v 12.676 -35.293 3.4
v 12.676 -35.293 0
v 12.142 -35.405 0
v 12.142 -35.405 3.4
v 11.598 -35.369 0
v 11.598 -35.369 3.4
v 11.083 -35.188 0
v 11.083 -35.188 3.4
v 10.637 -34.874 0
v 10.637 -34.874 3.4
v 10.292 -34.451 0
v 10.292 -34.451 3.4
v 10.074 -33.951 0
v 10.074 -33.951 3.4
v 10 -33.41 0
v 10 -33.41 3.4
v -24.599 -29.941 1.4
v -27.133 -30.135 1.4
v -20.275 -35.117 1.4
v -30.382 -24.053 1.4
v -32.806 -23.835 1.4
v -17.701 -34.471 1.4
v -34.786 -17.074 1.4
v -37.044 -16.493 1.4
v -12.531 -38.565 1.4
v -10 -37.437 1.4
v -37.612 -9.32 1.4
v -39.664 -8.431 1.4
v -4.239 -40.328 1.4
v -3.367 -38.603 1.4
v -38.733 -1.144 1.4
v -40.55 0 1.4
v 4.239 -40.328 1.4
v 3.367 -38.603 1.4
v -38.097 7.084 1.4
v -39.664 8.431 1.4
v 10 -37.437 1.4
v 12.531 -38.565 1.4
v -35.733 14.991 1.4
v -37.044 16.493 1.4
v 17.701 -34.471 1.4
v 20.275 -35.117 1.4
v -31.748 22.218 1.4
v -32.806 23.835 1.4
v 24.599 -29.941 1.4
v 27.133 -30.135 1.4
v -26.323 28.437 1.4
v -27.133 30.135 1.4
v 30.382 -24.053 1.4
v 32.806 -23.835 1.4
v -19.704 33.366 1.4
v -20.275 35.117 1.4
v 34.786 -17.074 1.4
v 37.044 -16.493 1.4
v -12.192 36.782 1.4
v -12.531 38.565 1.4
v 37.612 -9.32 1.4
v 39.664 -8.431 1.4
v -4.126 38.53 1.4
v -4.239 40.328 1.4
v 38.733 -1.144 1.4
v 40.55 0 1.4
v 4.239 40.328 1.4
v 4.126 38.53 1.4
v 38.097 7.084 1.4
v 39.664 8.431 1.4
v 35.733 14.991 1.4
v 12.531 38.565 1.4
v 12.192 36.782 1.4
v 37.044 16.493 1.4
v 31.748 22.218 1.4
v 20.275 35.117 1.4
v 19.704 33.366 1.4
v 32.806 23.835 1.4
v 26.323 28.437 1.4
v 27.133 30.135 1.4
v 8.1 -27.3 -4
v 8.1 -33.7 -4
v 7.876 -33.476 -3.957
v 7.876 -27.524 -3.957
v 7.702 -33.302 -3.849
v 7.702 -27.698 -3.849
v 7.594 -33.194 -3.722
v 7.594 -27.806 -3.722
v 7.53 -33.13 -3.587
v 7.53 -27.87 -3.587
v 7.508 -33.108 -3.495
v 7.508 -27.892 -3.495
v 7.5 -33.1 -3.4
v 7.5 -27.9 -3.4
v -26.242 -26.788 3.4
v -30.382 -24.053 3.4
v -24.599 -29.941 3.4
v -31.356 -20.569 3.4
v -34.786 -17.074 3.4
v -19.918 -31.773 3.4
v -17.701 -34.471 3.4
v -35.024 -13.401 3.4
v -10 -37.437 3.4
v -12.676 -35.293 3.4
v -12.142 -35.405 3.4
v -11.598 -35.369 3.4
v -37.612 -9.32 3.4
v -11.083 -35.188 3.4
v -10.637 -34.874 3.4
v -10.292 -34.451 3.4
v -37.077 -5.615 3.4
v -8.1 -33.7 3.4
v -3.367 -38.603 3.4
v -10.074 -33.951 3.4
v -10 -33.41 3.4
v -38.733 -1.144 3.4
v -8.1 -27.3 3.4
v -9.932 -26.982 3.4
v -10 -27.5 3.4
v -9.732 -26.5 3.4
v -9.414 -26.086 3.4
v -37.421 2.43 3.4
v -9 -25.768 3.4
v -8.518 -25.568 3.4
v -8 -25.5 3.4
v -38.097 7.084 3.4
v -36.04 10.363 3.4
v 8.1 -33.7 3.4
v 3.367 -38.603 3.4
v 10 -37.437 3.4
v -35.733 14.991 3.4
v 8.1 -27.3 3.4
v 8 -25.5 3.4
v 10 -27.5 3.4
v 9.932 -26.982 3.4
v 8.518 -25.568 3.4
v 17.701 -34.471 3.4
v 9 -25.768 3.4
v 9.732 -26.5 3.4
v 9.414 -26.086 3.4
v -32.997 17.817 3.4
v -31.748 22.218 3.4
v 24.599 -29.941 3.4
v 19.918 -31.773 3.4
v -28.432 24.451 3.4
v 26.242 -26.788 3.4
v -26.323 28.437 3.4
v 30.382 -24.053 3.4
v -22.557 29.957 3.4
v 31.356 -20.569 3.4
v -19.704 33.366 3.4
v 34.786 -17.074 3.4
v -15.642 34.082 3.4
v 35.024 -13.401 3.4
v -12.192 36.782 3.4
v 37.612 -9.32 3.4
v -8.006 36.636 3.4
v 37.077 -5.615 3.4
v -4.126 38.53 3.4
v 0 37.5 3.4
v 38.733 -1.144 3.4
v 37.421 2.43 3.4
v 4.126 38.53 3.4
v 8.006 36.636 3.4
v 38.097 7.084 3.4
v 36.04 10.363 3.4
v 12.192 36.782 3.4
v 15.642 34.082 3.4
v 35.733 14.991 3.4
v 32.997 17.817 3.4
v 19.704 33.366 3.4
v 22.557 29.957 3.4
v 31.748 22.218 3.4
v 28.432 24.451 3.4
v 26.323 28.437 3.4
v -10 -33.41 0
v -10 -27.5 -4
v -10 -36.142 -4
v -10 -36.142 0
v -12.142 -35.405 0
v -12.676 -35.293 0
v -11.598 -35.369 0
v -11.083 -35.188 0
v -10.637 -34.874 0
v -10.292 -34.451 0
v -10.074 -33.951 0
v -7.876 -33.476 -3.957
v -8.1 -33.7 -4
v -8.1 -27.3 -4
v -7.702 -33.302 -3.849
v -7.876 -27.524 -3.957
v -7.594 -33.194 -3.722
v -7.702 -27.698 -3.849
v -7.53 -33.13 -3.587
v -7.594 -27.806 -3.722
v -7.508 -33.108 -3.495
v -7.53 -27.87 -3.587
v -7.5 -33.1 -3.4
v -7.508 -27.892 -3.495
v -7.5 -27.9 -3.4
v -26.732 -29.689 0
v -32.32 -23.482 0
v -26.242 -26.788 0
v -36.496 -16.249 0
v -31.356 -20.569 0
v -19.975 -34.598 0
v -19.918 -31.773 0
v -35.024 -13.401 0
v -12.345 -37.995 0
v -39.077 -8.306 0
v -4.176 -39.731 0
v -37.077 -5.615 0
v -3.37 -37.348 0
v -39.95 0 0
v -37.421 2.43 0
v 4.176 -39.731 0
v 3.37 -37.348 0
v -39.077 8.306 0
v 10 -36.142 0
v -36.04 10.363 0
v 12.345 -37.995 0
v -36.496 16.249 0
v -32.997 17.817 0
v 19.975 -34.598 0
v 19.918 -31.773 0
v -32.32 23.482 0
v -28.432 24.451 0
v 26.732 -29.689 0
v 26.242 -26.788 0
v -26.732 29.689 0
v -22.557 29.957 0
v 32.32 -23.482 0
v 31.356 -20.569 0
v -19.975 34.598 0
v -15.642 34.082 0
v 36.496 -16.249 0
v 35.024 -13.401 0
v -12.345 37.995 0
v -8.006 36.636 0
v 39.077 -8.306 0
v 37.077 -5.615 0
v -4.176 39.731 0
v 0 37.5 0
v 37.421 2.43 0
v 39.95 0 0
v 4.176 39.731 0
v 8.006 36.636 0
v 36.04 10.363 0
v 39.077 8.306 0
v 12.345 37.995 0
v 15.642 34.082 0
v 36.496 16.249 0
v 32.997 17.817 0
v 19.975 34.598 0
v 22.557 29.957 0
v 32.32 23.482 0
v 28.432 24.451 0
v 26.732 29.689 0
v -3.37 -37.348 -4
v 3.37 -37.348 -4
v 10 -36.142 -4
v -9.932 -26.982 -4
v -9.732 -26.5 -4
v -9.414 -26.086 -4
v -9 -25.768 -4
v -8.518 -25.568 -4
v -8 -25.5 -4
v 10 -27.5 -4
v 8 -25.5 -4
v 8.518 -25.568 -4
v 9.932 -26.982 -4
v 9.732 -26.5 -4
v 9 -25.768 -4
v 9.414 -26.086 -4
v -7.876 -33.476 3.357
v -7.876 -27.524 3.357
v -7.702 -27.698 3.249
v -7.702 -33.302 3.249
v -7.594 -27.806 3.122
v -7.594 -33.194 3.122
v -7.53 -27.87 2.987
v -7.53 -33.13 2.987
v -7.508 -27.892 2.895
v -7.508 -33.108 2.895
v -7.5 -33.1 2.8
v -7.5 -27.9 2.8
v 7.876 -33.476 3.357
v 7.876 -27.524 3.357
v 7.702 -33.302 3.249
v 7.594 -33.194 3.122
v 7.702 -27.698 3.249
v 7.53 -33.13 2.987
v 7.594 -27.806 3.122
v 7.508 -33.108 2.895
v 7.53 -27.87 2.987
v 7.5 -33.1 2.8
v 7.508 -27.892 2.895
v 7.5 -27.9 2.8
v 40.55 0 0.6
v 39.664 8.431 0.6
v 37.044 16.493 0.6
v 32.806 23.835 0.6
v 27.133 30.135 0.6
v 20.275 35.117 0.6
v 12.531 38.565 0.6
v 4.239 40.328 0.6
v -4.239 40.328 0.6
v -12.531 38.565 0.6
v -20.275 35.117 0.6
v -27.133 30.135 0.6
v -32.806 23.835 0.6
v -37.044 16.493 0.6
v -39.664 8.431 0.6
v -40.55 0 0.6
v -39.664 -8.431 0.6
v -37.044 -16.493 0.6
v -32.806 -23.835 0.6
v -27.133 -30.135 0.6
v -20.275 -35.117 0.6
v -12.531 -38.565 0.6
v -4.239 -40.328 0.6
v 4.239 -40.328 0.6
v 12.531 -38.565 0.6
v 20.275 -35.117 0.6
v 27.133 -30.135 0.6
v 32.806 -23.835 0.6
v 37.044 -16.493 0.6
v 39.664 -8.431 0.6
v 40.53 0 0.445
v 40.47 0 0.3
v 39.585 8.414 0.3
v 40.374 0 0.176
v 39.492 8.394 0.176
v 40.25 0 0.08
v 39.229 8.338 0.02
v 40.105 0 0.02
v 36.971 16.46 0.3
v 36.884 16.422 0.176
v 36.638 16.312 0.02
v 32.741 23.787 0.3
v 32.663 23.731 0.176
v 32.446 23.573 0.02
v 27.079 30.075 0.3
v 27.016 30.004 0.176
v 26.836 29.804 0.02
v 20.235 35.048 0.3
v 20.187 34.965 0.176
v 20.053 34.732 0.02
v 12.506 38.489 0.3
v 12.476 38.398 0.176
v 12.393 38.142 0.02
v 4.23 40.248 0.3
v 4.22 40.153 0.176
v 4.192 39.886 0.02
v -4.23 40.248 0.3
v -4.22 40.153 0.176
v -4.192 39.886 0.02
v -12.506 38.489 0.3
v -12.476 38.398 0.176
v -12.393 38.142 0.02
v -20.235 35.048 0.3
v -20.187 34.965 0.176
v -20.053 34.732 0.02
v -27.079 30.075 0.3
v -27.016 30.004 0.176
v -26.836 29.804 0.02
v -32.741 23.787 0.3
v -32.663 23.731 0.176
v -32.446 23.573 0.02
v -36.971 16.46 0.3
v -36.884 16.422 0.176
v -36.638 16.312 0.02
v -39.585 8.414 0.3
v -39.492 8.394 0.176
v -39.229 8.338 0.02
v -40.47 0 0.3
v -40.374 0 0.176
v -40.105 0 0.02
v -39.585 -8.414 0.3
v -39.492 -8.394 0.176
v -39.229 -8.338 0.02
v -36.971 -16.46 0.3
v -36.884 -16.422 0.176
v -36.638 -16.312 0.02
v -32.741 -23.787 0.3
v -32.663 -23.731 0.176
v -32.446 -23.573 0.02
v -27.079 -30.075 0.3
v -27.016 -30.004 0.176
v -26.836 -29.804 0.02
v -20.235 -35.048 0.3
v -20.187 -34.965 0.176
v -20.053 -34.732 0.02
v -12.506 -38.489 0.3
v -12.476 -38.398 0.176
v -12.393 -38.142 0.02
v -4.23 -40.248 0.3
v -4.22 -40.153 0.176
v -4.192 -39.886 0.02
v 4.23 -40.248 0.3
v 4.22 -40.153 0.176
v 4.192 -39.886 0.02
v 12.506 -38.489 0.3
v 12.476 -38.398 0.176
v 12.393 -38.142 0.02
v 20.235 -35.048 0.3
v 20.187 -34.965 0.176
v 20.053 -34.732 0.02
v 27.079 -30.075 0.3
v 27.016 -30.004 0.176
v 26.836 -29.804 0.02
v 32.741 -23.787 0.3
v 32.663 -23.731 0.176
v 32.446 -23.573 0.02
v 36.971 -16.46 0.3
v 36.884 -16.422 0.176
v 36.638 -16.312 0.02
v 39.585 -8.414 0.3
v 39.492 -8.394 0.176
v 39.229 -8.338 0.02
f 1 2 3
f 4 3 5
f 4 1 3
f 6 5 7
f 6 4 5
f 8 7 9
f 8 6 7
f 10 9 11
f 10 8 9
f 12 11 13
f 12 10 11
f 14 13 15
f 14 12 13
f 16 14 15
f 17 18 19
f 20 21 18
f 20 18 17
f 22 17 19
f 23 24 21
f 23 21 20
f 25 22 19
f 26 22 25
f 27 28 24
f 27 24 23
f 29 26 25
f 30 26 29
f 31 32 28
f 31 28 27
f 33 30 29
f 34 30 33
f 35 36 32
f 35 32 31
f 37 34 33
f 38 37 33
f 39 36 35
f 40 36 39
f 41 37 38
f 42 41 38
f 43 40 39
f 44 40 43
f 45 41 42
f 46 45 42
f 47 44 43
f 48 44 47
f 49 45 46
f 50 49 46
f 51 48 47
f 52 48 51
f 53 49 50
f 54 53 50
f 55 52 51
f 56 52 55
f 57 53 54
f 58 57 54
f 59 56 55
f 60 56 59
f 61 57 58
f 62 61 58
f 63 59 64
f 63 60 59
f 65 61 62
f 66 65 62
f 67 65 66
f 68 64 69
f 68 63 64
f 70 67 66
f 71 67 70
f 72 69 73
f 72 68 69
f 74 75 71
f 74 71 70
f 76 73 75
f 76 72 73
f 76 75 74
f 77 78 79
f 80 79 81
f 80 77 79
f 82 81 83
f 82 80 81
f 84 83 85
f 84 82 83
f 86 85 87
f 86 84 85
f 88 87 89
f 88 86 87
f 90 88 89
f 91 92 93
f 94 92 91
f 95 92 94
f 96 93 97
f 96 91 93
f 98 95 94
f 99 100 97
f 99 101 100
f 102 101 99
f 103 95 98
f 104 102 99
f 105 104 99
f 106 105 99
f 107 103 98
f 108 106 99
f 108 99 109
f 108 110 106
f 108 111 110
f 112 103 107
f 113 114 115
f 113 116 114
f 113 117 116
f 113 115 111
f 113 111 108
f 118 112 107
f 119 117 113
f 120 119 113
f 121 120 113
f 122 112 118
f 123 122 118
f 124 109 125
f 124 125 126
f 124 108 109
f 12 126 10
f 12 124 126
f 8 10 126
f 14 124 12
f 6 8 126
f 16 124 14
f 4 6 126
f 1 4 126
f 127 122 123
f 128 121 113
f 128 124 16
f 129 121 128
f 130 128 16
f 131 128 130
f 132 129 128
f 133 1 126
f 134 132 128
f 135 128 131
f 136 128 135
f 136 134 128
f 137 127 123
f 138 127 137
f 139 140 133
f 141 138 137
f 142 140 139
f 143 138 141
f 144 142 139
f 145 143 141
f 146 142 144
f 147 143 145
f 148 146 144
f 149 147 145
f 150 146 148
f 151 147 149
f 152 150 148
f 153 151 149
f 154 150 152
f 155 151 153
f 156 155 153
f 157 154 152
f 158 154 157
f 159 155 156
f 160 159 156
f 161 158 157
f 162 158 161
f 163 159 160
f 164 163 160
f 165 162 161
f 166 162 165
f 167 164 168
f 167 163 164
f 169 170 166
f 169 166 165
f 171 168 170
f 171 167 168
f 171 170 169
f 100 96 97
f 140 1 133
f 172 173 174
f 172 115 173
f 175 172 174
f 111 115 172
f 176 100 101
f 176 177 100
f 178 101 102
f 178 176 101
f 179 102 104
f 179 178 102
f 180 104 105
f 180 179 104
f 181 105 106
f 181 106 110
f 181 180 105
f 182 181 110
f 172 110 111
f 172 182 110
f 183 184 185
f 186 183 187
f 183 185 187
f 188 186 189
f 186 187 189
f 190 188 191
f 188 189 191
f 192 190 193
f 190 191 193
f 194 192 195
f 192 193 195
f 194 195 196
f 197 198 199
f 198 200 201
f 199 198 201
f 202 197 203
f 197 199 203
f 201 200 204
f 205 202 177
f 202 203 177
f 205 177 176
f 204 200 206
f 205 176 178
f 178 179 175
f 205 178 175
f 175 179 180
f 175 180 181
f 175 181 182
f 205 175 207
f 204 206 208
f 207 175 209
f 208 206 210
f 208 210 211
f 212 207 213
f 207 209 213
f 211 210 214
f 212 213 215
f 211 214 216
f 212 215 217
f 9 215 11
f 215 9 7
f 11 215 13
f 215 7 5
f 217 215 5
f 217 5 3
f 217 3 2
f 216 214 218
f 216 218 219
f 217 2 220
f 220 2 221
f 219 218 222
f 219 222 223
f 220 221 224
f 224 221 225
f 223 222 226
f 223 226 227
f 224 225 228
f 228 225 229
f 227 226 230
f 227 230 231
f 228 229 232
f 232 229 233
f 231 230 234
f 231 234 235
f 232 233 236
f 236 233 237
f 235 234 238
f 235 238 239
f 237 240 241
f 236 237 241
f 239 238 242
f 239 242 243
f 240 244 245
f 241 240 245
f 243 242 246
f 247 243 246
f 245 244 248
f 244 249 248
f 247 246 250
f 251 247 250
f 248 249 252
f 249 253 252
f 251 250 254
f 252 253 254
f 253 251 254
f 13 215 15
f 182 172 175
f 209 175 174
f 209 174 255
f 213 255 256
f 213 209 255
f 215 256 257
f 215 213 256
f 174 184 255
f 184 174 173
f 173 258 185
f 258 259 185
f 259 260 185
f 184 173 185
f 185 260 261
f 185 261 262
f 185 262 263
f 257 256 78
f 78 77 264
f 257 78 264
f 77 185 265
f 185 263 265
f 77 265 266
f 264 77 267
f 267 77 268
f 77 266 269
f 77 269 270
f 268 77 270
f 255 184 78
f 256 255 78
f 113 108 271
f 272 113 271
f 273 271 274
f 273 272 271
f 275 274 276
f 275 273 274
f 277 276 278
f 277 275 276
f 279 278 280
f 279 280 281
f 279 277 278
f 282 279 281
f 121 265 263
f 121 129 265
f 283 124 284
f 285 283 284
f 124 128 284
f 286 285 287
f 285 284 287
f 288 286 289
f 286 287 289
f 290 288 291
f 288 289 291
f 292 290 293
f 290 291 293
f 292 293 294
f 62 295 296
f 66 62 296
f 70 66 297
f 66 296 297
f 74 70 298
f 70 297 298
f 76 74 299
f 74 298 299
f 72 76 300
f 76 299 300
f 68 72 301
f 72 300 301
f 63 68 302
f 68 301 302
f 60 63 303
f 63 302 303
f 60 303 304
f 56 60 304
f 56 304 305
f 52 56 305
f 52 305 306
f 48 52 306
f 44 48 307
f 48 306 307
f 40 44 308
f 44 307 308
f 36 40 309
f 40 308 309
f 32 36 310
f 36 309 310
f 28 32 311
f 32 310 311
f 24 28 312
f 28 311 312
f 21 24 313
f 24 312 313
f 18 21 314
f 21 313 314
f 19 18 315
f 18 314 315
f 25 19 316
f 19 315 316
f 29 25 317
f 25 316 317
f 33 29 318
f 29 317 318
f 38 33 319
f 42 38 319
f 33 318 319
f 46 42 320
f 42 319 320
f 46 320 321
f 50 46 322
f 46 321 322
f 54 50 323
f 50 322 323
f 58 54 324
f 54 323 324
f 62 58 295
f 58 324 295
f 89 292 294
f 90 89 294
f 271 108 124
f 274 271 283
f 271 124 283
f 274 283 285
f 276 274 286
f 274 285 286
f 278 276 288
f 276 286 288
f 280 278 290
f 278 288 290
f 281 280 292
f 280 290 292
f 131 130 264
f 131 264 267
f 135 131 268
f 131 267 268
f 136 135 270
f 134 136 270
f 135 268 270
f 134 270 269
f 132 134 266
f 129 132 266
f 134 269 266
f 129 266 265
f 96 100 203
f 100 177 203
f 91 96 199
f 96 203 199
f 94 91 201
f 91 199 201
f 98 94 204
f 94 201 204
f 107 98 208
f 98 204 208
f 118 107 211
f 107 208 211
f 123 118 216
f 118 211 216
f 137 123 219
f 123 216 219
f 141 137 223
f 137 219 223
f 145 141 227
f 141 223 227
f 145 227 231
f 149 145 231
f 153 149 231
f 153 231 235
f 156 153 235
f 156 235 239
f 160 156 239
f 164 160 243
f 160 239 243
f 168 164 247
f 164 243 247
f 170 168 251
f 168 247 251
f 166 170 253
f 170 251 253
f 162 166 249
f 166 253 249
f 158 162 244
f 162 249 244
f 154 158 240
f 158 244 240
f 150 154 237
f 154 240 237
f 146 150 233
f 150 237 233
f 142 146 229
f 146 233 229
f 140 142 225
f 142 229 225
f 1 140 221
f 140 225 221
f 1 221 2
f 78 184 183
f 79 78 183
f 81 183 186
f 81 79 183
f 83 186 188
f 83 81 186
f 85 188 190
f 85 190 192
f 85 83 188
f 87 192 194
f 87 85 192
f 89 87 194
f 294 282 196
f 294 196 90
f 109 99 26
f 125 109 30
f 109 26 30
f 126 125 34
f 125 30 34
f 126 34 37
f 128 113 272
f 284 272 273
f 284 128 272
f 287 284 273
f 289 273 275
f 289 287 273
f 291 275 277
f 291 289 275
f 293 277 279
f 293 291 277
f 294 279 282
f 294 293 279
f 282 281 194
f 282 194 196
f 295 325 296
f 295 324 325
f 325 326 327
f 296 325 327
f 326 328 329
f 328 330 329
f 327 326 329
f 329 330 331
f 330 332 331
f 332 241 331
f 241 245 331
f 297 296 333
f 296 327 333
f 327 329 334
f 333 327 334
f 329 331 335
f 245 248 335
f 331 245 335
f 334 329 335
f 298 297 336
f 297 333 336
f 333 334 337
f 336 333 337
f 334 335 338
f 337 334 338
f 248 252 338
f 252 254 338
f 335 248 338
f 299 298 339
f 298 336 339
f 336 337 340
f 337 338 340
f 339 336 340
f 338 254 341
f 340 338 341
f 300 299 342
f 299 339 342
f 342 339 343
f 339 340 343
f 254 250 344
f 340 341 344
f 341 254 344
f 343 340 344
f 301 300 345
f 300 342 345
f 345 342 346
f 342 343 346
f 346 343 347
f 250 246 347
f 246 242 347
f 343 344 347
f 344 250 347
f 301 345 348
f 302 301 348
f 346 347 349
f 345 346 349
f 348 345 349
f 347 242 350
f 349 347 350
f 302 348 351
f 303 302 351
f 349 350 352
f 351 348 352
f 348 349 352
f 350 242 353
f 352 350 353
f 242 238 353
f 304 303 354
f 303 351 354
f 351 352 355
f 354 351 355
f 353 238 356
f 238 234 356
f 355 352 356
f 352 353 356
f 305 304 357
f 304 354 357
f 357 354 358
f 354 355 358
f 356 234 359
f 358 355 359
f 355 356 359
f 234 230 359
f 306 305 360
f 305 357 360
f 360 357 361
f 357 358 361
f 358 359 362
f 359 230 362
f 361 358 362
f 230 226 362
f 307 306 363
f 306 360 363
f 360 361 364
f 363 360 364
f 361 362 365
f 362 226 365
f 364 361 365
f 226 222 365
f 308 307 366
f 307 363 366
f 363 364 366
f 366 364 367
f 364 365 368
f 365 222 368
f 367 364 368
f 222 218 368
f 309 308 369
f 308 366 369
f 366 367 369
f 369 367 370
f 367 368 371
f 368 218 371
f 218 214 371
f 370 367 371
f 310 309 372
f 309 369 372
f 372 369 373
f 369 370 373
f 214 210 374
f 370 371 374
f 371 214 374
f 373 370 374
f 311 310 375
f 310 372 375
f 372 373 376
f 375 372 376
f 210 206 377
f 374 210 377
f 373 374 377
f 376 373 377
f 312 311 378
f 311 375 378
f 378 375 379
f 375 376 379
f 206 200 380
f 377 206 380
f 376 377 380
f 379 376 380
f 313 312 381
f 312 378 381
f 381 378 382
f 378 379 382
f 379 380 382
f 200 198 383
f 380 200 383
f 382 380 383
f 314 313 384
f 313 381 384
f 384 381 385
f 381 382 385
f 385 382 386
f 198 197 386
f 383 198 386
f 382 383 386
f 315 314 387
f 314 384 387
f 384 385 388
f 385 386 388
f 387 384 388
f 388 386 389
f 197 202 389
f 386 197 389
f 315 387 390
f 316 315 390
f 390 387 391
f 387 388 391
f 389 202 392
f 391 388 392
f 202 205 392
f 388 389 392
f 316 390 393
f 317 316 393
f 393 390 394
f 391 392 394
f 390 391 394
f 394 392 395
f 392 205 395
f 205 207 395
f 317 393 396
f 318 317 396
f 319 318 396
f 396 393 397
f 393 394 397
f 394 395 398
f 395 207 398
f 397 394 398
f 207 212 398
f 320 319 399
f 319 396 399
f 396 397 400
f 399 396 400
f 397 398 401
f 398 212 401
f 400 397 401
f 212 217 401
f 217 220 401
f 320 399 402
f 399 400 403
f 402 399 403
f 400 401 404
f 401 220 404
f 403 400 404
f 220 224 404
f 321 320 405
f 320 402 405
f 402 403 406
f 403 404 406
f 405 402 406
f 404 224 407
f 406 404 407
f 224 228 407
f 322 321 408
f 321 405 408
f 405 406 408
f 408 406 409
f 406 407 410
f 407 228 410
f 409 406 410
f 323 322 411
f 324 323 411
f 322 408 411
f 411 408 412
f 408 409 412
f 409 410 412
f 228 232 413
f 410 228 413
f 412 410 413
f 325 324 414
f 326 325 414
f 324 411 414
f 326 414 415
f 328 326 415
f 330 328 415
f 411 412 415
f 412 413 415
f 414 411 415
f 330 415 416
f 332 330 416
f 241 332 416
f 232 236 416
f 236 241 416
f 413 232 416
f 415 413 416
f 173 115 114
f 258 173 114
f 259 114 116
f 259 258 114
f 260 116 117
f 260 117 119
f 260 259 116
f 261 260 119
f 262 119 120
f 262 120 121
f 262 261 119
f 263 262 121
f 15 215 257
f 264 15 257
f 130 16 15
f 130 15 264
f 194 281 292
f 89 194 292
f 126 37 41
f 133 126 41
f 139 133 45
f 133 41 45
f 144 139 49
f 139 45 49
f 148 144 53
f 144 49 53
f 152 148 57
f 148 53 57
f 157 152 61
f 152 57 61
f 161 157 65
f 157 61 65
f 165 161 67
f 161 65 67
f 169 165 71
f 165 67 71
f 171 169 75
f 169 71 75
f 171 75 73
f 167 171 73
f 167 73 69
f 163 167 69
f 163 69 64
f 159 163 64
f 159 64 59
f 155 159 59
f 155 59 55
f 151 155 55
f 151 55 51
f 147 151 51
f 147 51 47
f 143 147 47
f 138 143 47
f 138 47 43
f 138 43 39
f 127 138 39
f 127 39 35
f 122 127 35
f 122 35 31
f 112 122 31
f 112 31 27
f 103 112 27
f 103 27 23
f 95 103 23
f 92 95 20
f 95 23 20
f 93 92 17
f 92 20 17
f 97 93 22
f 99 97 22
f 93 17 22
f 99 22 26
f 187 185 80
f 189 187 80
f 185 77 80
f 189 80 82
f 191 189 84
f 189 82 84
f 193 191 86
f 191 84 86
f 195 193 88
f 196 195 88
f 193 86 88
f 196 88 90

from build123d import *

# Parameters (mm, degrees)
F0_R     = 40.55
F0_W     = 15
F0_H     = 5.2
F1_DEPTH = 1.4
F2_DEPTH = 3.4
F3_DEPTH = 4
F4_R     = 0.6
F5_R     = 2
F6_R     = 0.6


with BuildPart() as f1:
    # F0 (on Top) → F1 (new body)
    with BuildSketch(Plane.XY):
        Circle(F0_R)
        with BuildLine():
            ThreePointArc((-10, -37.4374478297), (-23.6015094856, 30.7332271329), (38.75, 0))
            ThreePointArc((38.75, 0), (30.7332271329, -23.6015094856), (10, -37.4374478297))
            Line((10, -37.4374478297), (10, -39))
            Line((10, -39), (-10, -39))
            Line((-10, -39), (-10, -37.4374478297))
        make_face(mode=Mode.SUBTRACT)
        with BuildLine():
            ThreePointArc((10, -37.4374478297), (30.7332271329, -23.6015094856), (38.75, 0))
            ThreePointArc((38.75, 0), (-23.6015094856, 30.7332271329), (-10, -37.4374478297))
            Line((-10, -37.4374478297), (-10, -36.142080737))
            ThreePointArc((-10, -36.142080737), (-22.7073776557, 29.8433409658), (37.5, 0))
            ThreePointArc((37.5, 0), (29.8433409658, -22.7073776557), (10, -36.142080737))
            Line((10, -36.142080737), (10, -37.4374478297))
        make_face()
        with BuildLine():
            Line((-10, -25.5), (-10, -36.142080737))
            ThreePointArc((-10, -36.142080737), (0, -37.5), (10, -36.142080737))
            Line((10, -36.142080737), (10, -25.5))
            Line((10, -25.5), (-10, -25.5))
        make_face()
        with Locations((0, -30.5)):
            Rectangle(F0_W, F0_H, mode=Mode.SUBTRACT)
        with BuildLine():
            Line((-10, -36.142080737), (-10, -37.4374478297))
            ThreePointArc((-10, -37.4374478297), (0, -38.75), (10, -37.4374478297))
            Line((10, -37.4374478297), (10, -36.142080737))
            ThreePointArc((10, -36.142080737), (0, -37.5), (-10, -36.142080737))
        make_face()
        with BuildLine():
            ThreePointArc((10, -37.4374478297), (0, -38.75), (-10, -37.4374478297))
            Line((-10, -37.4374478297), (-10, -39))
            Line((-10, -39), (10, -39))
            Line((10, -39), (10, -37.4374478297))
        make_face()
    extrude(amount=F1_DEPTH)

    # F0 (on Top) → F2 (join)
    with BuildSketch(Plane.XY):
        with BuildLine():
            ThreePointArc((10, -37.4374478297), (30.7332271329, -23.6015094856), (38.75, 0))
            ThreePointArc((38.75, 0), (-23.6015094856, 30.7332271329), (-10, -37.4374478297))
            Line((-10, -37.4374478297), (-10, -36.142080737))
            ThreePointArc((-10, -36.142080737), (-22.7073776557, 29.8433409658), (37.5, 0))
            ThreePointArc((37.5, 0), (29.8433409658, -22.7073776557), (10, -36.142080737))
            Line((10, -36.142080737), (10, -37.4374478297))
        make_face()
        with BuildLine():
            Line((-10, -36.142080737), (-10, -37.4374478297))
            ThreePointArc((-10, -37.4374478297), (0, -38.75), (10, -37.4374478297))
            Line((10, -37.4374478297), (10, -36.142080737))
            ThreePointArc((10, -36.142080737), (0, -37.5), (-10, -36.142080737))
        make_face()
        with BuildLine():
            Line((-10, -25.5), (-10, -36.142080737))
            ThreePointArc((-10, -36.142080737), (0, -37.5), (10, -36.142080737))
            Line((10, -36.142080737), (10, -25.5))
            Line((10, -25.5), (-10, -25.5))
        make_face()
        with Locations((0, -30.5)):
            Rectangle(F0_W, F0_H, mode=Mode.SUBTRACT)
    extrude(amount=F2_DEPTH)

    # F0 (on Top) → F3 (join)
    with BuildSketch(Plane.XY):
        with BuildLine():
            Line((-10, -25.5), (-10, -36.142080737))
            ThreePointArc((-10, -36.142080737), (0, -37.5), (10, -36.142080737))
            Line((10, -36.142080737), (10, -25.5))
            Line((10, -25.5), (-10, -25.5))
        make_face()
        with Locations((0, -30.5)):
            Rectangle(F0_W, F0_H, mode=Mode.SUBTRACT)
    extrude(amount=-F3_DEPTH)

    # F4
    f4_edges = [f1.edges().sort_by_distance(p)[0] for p in [
        (-40.55, 0, 0),
    ]]
    fillet(f4_edges, radius=F4_R)

    # F5
    f5_edges = [f1.edges().sort_by_distance(p)[0] for p in [
        (-10, -25.5, -0.3),
        (10, -25.5, -0.3),
        (10, -36.142081, 1.7),
        (-10, -36.142081, 1.7),
    ]]
    fillet(f5_edges, radius=F5_R)

    # F6
    f6_edges = [f1.edges().sort_by_distance(p)[0] for p in [
        (7.5, -30.5, 3.4),
        (0, -27.9, 3.4),
        (-7.5, -30.5, 3.4),
        (0, -33.1, 3.4),
        (-7.5, -30.5, -4),
        (0, -27.9, -4),
        (7.5, -30.5, -4),
        (0, -33.1, -4),
    ]]
    fillet(f6_edges, radius=F6_R)


solid = f1.part
